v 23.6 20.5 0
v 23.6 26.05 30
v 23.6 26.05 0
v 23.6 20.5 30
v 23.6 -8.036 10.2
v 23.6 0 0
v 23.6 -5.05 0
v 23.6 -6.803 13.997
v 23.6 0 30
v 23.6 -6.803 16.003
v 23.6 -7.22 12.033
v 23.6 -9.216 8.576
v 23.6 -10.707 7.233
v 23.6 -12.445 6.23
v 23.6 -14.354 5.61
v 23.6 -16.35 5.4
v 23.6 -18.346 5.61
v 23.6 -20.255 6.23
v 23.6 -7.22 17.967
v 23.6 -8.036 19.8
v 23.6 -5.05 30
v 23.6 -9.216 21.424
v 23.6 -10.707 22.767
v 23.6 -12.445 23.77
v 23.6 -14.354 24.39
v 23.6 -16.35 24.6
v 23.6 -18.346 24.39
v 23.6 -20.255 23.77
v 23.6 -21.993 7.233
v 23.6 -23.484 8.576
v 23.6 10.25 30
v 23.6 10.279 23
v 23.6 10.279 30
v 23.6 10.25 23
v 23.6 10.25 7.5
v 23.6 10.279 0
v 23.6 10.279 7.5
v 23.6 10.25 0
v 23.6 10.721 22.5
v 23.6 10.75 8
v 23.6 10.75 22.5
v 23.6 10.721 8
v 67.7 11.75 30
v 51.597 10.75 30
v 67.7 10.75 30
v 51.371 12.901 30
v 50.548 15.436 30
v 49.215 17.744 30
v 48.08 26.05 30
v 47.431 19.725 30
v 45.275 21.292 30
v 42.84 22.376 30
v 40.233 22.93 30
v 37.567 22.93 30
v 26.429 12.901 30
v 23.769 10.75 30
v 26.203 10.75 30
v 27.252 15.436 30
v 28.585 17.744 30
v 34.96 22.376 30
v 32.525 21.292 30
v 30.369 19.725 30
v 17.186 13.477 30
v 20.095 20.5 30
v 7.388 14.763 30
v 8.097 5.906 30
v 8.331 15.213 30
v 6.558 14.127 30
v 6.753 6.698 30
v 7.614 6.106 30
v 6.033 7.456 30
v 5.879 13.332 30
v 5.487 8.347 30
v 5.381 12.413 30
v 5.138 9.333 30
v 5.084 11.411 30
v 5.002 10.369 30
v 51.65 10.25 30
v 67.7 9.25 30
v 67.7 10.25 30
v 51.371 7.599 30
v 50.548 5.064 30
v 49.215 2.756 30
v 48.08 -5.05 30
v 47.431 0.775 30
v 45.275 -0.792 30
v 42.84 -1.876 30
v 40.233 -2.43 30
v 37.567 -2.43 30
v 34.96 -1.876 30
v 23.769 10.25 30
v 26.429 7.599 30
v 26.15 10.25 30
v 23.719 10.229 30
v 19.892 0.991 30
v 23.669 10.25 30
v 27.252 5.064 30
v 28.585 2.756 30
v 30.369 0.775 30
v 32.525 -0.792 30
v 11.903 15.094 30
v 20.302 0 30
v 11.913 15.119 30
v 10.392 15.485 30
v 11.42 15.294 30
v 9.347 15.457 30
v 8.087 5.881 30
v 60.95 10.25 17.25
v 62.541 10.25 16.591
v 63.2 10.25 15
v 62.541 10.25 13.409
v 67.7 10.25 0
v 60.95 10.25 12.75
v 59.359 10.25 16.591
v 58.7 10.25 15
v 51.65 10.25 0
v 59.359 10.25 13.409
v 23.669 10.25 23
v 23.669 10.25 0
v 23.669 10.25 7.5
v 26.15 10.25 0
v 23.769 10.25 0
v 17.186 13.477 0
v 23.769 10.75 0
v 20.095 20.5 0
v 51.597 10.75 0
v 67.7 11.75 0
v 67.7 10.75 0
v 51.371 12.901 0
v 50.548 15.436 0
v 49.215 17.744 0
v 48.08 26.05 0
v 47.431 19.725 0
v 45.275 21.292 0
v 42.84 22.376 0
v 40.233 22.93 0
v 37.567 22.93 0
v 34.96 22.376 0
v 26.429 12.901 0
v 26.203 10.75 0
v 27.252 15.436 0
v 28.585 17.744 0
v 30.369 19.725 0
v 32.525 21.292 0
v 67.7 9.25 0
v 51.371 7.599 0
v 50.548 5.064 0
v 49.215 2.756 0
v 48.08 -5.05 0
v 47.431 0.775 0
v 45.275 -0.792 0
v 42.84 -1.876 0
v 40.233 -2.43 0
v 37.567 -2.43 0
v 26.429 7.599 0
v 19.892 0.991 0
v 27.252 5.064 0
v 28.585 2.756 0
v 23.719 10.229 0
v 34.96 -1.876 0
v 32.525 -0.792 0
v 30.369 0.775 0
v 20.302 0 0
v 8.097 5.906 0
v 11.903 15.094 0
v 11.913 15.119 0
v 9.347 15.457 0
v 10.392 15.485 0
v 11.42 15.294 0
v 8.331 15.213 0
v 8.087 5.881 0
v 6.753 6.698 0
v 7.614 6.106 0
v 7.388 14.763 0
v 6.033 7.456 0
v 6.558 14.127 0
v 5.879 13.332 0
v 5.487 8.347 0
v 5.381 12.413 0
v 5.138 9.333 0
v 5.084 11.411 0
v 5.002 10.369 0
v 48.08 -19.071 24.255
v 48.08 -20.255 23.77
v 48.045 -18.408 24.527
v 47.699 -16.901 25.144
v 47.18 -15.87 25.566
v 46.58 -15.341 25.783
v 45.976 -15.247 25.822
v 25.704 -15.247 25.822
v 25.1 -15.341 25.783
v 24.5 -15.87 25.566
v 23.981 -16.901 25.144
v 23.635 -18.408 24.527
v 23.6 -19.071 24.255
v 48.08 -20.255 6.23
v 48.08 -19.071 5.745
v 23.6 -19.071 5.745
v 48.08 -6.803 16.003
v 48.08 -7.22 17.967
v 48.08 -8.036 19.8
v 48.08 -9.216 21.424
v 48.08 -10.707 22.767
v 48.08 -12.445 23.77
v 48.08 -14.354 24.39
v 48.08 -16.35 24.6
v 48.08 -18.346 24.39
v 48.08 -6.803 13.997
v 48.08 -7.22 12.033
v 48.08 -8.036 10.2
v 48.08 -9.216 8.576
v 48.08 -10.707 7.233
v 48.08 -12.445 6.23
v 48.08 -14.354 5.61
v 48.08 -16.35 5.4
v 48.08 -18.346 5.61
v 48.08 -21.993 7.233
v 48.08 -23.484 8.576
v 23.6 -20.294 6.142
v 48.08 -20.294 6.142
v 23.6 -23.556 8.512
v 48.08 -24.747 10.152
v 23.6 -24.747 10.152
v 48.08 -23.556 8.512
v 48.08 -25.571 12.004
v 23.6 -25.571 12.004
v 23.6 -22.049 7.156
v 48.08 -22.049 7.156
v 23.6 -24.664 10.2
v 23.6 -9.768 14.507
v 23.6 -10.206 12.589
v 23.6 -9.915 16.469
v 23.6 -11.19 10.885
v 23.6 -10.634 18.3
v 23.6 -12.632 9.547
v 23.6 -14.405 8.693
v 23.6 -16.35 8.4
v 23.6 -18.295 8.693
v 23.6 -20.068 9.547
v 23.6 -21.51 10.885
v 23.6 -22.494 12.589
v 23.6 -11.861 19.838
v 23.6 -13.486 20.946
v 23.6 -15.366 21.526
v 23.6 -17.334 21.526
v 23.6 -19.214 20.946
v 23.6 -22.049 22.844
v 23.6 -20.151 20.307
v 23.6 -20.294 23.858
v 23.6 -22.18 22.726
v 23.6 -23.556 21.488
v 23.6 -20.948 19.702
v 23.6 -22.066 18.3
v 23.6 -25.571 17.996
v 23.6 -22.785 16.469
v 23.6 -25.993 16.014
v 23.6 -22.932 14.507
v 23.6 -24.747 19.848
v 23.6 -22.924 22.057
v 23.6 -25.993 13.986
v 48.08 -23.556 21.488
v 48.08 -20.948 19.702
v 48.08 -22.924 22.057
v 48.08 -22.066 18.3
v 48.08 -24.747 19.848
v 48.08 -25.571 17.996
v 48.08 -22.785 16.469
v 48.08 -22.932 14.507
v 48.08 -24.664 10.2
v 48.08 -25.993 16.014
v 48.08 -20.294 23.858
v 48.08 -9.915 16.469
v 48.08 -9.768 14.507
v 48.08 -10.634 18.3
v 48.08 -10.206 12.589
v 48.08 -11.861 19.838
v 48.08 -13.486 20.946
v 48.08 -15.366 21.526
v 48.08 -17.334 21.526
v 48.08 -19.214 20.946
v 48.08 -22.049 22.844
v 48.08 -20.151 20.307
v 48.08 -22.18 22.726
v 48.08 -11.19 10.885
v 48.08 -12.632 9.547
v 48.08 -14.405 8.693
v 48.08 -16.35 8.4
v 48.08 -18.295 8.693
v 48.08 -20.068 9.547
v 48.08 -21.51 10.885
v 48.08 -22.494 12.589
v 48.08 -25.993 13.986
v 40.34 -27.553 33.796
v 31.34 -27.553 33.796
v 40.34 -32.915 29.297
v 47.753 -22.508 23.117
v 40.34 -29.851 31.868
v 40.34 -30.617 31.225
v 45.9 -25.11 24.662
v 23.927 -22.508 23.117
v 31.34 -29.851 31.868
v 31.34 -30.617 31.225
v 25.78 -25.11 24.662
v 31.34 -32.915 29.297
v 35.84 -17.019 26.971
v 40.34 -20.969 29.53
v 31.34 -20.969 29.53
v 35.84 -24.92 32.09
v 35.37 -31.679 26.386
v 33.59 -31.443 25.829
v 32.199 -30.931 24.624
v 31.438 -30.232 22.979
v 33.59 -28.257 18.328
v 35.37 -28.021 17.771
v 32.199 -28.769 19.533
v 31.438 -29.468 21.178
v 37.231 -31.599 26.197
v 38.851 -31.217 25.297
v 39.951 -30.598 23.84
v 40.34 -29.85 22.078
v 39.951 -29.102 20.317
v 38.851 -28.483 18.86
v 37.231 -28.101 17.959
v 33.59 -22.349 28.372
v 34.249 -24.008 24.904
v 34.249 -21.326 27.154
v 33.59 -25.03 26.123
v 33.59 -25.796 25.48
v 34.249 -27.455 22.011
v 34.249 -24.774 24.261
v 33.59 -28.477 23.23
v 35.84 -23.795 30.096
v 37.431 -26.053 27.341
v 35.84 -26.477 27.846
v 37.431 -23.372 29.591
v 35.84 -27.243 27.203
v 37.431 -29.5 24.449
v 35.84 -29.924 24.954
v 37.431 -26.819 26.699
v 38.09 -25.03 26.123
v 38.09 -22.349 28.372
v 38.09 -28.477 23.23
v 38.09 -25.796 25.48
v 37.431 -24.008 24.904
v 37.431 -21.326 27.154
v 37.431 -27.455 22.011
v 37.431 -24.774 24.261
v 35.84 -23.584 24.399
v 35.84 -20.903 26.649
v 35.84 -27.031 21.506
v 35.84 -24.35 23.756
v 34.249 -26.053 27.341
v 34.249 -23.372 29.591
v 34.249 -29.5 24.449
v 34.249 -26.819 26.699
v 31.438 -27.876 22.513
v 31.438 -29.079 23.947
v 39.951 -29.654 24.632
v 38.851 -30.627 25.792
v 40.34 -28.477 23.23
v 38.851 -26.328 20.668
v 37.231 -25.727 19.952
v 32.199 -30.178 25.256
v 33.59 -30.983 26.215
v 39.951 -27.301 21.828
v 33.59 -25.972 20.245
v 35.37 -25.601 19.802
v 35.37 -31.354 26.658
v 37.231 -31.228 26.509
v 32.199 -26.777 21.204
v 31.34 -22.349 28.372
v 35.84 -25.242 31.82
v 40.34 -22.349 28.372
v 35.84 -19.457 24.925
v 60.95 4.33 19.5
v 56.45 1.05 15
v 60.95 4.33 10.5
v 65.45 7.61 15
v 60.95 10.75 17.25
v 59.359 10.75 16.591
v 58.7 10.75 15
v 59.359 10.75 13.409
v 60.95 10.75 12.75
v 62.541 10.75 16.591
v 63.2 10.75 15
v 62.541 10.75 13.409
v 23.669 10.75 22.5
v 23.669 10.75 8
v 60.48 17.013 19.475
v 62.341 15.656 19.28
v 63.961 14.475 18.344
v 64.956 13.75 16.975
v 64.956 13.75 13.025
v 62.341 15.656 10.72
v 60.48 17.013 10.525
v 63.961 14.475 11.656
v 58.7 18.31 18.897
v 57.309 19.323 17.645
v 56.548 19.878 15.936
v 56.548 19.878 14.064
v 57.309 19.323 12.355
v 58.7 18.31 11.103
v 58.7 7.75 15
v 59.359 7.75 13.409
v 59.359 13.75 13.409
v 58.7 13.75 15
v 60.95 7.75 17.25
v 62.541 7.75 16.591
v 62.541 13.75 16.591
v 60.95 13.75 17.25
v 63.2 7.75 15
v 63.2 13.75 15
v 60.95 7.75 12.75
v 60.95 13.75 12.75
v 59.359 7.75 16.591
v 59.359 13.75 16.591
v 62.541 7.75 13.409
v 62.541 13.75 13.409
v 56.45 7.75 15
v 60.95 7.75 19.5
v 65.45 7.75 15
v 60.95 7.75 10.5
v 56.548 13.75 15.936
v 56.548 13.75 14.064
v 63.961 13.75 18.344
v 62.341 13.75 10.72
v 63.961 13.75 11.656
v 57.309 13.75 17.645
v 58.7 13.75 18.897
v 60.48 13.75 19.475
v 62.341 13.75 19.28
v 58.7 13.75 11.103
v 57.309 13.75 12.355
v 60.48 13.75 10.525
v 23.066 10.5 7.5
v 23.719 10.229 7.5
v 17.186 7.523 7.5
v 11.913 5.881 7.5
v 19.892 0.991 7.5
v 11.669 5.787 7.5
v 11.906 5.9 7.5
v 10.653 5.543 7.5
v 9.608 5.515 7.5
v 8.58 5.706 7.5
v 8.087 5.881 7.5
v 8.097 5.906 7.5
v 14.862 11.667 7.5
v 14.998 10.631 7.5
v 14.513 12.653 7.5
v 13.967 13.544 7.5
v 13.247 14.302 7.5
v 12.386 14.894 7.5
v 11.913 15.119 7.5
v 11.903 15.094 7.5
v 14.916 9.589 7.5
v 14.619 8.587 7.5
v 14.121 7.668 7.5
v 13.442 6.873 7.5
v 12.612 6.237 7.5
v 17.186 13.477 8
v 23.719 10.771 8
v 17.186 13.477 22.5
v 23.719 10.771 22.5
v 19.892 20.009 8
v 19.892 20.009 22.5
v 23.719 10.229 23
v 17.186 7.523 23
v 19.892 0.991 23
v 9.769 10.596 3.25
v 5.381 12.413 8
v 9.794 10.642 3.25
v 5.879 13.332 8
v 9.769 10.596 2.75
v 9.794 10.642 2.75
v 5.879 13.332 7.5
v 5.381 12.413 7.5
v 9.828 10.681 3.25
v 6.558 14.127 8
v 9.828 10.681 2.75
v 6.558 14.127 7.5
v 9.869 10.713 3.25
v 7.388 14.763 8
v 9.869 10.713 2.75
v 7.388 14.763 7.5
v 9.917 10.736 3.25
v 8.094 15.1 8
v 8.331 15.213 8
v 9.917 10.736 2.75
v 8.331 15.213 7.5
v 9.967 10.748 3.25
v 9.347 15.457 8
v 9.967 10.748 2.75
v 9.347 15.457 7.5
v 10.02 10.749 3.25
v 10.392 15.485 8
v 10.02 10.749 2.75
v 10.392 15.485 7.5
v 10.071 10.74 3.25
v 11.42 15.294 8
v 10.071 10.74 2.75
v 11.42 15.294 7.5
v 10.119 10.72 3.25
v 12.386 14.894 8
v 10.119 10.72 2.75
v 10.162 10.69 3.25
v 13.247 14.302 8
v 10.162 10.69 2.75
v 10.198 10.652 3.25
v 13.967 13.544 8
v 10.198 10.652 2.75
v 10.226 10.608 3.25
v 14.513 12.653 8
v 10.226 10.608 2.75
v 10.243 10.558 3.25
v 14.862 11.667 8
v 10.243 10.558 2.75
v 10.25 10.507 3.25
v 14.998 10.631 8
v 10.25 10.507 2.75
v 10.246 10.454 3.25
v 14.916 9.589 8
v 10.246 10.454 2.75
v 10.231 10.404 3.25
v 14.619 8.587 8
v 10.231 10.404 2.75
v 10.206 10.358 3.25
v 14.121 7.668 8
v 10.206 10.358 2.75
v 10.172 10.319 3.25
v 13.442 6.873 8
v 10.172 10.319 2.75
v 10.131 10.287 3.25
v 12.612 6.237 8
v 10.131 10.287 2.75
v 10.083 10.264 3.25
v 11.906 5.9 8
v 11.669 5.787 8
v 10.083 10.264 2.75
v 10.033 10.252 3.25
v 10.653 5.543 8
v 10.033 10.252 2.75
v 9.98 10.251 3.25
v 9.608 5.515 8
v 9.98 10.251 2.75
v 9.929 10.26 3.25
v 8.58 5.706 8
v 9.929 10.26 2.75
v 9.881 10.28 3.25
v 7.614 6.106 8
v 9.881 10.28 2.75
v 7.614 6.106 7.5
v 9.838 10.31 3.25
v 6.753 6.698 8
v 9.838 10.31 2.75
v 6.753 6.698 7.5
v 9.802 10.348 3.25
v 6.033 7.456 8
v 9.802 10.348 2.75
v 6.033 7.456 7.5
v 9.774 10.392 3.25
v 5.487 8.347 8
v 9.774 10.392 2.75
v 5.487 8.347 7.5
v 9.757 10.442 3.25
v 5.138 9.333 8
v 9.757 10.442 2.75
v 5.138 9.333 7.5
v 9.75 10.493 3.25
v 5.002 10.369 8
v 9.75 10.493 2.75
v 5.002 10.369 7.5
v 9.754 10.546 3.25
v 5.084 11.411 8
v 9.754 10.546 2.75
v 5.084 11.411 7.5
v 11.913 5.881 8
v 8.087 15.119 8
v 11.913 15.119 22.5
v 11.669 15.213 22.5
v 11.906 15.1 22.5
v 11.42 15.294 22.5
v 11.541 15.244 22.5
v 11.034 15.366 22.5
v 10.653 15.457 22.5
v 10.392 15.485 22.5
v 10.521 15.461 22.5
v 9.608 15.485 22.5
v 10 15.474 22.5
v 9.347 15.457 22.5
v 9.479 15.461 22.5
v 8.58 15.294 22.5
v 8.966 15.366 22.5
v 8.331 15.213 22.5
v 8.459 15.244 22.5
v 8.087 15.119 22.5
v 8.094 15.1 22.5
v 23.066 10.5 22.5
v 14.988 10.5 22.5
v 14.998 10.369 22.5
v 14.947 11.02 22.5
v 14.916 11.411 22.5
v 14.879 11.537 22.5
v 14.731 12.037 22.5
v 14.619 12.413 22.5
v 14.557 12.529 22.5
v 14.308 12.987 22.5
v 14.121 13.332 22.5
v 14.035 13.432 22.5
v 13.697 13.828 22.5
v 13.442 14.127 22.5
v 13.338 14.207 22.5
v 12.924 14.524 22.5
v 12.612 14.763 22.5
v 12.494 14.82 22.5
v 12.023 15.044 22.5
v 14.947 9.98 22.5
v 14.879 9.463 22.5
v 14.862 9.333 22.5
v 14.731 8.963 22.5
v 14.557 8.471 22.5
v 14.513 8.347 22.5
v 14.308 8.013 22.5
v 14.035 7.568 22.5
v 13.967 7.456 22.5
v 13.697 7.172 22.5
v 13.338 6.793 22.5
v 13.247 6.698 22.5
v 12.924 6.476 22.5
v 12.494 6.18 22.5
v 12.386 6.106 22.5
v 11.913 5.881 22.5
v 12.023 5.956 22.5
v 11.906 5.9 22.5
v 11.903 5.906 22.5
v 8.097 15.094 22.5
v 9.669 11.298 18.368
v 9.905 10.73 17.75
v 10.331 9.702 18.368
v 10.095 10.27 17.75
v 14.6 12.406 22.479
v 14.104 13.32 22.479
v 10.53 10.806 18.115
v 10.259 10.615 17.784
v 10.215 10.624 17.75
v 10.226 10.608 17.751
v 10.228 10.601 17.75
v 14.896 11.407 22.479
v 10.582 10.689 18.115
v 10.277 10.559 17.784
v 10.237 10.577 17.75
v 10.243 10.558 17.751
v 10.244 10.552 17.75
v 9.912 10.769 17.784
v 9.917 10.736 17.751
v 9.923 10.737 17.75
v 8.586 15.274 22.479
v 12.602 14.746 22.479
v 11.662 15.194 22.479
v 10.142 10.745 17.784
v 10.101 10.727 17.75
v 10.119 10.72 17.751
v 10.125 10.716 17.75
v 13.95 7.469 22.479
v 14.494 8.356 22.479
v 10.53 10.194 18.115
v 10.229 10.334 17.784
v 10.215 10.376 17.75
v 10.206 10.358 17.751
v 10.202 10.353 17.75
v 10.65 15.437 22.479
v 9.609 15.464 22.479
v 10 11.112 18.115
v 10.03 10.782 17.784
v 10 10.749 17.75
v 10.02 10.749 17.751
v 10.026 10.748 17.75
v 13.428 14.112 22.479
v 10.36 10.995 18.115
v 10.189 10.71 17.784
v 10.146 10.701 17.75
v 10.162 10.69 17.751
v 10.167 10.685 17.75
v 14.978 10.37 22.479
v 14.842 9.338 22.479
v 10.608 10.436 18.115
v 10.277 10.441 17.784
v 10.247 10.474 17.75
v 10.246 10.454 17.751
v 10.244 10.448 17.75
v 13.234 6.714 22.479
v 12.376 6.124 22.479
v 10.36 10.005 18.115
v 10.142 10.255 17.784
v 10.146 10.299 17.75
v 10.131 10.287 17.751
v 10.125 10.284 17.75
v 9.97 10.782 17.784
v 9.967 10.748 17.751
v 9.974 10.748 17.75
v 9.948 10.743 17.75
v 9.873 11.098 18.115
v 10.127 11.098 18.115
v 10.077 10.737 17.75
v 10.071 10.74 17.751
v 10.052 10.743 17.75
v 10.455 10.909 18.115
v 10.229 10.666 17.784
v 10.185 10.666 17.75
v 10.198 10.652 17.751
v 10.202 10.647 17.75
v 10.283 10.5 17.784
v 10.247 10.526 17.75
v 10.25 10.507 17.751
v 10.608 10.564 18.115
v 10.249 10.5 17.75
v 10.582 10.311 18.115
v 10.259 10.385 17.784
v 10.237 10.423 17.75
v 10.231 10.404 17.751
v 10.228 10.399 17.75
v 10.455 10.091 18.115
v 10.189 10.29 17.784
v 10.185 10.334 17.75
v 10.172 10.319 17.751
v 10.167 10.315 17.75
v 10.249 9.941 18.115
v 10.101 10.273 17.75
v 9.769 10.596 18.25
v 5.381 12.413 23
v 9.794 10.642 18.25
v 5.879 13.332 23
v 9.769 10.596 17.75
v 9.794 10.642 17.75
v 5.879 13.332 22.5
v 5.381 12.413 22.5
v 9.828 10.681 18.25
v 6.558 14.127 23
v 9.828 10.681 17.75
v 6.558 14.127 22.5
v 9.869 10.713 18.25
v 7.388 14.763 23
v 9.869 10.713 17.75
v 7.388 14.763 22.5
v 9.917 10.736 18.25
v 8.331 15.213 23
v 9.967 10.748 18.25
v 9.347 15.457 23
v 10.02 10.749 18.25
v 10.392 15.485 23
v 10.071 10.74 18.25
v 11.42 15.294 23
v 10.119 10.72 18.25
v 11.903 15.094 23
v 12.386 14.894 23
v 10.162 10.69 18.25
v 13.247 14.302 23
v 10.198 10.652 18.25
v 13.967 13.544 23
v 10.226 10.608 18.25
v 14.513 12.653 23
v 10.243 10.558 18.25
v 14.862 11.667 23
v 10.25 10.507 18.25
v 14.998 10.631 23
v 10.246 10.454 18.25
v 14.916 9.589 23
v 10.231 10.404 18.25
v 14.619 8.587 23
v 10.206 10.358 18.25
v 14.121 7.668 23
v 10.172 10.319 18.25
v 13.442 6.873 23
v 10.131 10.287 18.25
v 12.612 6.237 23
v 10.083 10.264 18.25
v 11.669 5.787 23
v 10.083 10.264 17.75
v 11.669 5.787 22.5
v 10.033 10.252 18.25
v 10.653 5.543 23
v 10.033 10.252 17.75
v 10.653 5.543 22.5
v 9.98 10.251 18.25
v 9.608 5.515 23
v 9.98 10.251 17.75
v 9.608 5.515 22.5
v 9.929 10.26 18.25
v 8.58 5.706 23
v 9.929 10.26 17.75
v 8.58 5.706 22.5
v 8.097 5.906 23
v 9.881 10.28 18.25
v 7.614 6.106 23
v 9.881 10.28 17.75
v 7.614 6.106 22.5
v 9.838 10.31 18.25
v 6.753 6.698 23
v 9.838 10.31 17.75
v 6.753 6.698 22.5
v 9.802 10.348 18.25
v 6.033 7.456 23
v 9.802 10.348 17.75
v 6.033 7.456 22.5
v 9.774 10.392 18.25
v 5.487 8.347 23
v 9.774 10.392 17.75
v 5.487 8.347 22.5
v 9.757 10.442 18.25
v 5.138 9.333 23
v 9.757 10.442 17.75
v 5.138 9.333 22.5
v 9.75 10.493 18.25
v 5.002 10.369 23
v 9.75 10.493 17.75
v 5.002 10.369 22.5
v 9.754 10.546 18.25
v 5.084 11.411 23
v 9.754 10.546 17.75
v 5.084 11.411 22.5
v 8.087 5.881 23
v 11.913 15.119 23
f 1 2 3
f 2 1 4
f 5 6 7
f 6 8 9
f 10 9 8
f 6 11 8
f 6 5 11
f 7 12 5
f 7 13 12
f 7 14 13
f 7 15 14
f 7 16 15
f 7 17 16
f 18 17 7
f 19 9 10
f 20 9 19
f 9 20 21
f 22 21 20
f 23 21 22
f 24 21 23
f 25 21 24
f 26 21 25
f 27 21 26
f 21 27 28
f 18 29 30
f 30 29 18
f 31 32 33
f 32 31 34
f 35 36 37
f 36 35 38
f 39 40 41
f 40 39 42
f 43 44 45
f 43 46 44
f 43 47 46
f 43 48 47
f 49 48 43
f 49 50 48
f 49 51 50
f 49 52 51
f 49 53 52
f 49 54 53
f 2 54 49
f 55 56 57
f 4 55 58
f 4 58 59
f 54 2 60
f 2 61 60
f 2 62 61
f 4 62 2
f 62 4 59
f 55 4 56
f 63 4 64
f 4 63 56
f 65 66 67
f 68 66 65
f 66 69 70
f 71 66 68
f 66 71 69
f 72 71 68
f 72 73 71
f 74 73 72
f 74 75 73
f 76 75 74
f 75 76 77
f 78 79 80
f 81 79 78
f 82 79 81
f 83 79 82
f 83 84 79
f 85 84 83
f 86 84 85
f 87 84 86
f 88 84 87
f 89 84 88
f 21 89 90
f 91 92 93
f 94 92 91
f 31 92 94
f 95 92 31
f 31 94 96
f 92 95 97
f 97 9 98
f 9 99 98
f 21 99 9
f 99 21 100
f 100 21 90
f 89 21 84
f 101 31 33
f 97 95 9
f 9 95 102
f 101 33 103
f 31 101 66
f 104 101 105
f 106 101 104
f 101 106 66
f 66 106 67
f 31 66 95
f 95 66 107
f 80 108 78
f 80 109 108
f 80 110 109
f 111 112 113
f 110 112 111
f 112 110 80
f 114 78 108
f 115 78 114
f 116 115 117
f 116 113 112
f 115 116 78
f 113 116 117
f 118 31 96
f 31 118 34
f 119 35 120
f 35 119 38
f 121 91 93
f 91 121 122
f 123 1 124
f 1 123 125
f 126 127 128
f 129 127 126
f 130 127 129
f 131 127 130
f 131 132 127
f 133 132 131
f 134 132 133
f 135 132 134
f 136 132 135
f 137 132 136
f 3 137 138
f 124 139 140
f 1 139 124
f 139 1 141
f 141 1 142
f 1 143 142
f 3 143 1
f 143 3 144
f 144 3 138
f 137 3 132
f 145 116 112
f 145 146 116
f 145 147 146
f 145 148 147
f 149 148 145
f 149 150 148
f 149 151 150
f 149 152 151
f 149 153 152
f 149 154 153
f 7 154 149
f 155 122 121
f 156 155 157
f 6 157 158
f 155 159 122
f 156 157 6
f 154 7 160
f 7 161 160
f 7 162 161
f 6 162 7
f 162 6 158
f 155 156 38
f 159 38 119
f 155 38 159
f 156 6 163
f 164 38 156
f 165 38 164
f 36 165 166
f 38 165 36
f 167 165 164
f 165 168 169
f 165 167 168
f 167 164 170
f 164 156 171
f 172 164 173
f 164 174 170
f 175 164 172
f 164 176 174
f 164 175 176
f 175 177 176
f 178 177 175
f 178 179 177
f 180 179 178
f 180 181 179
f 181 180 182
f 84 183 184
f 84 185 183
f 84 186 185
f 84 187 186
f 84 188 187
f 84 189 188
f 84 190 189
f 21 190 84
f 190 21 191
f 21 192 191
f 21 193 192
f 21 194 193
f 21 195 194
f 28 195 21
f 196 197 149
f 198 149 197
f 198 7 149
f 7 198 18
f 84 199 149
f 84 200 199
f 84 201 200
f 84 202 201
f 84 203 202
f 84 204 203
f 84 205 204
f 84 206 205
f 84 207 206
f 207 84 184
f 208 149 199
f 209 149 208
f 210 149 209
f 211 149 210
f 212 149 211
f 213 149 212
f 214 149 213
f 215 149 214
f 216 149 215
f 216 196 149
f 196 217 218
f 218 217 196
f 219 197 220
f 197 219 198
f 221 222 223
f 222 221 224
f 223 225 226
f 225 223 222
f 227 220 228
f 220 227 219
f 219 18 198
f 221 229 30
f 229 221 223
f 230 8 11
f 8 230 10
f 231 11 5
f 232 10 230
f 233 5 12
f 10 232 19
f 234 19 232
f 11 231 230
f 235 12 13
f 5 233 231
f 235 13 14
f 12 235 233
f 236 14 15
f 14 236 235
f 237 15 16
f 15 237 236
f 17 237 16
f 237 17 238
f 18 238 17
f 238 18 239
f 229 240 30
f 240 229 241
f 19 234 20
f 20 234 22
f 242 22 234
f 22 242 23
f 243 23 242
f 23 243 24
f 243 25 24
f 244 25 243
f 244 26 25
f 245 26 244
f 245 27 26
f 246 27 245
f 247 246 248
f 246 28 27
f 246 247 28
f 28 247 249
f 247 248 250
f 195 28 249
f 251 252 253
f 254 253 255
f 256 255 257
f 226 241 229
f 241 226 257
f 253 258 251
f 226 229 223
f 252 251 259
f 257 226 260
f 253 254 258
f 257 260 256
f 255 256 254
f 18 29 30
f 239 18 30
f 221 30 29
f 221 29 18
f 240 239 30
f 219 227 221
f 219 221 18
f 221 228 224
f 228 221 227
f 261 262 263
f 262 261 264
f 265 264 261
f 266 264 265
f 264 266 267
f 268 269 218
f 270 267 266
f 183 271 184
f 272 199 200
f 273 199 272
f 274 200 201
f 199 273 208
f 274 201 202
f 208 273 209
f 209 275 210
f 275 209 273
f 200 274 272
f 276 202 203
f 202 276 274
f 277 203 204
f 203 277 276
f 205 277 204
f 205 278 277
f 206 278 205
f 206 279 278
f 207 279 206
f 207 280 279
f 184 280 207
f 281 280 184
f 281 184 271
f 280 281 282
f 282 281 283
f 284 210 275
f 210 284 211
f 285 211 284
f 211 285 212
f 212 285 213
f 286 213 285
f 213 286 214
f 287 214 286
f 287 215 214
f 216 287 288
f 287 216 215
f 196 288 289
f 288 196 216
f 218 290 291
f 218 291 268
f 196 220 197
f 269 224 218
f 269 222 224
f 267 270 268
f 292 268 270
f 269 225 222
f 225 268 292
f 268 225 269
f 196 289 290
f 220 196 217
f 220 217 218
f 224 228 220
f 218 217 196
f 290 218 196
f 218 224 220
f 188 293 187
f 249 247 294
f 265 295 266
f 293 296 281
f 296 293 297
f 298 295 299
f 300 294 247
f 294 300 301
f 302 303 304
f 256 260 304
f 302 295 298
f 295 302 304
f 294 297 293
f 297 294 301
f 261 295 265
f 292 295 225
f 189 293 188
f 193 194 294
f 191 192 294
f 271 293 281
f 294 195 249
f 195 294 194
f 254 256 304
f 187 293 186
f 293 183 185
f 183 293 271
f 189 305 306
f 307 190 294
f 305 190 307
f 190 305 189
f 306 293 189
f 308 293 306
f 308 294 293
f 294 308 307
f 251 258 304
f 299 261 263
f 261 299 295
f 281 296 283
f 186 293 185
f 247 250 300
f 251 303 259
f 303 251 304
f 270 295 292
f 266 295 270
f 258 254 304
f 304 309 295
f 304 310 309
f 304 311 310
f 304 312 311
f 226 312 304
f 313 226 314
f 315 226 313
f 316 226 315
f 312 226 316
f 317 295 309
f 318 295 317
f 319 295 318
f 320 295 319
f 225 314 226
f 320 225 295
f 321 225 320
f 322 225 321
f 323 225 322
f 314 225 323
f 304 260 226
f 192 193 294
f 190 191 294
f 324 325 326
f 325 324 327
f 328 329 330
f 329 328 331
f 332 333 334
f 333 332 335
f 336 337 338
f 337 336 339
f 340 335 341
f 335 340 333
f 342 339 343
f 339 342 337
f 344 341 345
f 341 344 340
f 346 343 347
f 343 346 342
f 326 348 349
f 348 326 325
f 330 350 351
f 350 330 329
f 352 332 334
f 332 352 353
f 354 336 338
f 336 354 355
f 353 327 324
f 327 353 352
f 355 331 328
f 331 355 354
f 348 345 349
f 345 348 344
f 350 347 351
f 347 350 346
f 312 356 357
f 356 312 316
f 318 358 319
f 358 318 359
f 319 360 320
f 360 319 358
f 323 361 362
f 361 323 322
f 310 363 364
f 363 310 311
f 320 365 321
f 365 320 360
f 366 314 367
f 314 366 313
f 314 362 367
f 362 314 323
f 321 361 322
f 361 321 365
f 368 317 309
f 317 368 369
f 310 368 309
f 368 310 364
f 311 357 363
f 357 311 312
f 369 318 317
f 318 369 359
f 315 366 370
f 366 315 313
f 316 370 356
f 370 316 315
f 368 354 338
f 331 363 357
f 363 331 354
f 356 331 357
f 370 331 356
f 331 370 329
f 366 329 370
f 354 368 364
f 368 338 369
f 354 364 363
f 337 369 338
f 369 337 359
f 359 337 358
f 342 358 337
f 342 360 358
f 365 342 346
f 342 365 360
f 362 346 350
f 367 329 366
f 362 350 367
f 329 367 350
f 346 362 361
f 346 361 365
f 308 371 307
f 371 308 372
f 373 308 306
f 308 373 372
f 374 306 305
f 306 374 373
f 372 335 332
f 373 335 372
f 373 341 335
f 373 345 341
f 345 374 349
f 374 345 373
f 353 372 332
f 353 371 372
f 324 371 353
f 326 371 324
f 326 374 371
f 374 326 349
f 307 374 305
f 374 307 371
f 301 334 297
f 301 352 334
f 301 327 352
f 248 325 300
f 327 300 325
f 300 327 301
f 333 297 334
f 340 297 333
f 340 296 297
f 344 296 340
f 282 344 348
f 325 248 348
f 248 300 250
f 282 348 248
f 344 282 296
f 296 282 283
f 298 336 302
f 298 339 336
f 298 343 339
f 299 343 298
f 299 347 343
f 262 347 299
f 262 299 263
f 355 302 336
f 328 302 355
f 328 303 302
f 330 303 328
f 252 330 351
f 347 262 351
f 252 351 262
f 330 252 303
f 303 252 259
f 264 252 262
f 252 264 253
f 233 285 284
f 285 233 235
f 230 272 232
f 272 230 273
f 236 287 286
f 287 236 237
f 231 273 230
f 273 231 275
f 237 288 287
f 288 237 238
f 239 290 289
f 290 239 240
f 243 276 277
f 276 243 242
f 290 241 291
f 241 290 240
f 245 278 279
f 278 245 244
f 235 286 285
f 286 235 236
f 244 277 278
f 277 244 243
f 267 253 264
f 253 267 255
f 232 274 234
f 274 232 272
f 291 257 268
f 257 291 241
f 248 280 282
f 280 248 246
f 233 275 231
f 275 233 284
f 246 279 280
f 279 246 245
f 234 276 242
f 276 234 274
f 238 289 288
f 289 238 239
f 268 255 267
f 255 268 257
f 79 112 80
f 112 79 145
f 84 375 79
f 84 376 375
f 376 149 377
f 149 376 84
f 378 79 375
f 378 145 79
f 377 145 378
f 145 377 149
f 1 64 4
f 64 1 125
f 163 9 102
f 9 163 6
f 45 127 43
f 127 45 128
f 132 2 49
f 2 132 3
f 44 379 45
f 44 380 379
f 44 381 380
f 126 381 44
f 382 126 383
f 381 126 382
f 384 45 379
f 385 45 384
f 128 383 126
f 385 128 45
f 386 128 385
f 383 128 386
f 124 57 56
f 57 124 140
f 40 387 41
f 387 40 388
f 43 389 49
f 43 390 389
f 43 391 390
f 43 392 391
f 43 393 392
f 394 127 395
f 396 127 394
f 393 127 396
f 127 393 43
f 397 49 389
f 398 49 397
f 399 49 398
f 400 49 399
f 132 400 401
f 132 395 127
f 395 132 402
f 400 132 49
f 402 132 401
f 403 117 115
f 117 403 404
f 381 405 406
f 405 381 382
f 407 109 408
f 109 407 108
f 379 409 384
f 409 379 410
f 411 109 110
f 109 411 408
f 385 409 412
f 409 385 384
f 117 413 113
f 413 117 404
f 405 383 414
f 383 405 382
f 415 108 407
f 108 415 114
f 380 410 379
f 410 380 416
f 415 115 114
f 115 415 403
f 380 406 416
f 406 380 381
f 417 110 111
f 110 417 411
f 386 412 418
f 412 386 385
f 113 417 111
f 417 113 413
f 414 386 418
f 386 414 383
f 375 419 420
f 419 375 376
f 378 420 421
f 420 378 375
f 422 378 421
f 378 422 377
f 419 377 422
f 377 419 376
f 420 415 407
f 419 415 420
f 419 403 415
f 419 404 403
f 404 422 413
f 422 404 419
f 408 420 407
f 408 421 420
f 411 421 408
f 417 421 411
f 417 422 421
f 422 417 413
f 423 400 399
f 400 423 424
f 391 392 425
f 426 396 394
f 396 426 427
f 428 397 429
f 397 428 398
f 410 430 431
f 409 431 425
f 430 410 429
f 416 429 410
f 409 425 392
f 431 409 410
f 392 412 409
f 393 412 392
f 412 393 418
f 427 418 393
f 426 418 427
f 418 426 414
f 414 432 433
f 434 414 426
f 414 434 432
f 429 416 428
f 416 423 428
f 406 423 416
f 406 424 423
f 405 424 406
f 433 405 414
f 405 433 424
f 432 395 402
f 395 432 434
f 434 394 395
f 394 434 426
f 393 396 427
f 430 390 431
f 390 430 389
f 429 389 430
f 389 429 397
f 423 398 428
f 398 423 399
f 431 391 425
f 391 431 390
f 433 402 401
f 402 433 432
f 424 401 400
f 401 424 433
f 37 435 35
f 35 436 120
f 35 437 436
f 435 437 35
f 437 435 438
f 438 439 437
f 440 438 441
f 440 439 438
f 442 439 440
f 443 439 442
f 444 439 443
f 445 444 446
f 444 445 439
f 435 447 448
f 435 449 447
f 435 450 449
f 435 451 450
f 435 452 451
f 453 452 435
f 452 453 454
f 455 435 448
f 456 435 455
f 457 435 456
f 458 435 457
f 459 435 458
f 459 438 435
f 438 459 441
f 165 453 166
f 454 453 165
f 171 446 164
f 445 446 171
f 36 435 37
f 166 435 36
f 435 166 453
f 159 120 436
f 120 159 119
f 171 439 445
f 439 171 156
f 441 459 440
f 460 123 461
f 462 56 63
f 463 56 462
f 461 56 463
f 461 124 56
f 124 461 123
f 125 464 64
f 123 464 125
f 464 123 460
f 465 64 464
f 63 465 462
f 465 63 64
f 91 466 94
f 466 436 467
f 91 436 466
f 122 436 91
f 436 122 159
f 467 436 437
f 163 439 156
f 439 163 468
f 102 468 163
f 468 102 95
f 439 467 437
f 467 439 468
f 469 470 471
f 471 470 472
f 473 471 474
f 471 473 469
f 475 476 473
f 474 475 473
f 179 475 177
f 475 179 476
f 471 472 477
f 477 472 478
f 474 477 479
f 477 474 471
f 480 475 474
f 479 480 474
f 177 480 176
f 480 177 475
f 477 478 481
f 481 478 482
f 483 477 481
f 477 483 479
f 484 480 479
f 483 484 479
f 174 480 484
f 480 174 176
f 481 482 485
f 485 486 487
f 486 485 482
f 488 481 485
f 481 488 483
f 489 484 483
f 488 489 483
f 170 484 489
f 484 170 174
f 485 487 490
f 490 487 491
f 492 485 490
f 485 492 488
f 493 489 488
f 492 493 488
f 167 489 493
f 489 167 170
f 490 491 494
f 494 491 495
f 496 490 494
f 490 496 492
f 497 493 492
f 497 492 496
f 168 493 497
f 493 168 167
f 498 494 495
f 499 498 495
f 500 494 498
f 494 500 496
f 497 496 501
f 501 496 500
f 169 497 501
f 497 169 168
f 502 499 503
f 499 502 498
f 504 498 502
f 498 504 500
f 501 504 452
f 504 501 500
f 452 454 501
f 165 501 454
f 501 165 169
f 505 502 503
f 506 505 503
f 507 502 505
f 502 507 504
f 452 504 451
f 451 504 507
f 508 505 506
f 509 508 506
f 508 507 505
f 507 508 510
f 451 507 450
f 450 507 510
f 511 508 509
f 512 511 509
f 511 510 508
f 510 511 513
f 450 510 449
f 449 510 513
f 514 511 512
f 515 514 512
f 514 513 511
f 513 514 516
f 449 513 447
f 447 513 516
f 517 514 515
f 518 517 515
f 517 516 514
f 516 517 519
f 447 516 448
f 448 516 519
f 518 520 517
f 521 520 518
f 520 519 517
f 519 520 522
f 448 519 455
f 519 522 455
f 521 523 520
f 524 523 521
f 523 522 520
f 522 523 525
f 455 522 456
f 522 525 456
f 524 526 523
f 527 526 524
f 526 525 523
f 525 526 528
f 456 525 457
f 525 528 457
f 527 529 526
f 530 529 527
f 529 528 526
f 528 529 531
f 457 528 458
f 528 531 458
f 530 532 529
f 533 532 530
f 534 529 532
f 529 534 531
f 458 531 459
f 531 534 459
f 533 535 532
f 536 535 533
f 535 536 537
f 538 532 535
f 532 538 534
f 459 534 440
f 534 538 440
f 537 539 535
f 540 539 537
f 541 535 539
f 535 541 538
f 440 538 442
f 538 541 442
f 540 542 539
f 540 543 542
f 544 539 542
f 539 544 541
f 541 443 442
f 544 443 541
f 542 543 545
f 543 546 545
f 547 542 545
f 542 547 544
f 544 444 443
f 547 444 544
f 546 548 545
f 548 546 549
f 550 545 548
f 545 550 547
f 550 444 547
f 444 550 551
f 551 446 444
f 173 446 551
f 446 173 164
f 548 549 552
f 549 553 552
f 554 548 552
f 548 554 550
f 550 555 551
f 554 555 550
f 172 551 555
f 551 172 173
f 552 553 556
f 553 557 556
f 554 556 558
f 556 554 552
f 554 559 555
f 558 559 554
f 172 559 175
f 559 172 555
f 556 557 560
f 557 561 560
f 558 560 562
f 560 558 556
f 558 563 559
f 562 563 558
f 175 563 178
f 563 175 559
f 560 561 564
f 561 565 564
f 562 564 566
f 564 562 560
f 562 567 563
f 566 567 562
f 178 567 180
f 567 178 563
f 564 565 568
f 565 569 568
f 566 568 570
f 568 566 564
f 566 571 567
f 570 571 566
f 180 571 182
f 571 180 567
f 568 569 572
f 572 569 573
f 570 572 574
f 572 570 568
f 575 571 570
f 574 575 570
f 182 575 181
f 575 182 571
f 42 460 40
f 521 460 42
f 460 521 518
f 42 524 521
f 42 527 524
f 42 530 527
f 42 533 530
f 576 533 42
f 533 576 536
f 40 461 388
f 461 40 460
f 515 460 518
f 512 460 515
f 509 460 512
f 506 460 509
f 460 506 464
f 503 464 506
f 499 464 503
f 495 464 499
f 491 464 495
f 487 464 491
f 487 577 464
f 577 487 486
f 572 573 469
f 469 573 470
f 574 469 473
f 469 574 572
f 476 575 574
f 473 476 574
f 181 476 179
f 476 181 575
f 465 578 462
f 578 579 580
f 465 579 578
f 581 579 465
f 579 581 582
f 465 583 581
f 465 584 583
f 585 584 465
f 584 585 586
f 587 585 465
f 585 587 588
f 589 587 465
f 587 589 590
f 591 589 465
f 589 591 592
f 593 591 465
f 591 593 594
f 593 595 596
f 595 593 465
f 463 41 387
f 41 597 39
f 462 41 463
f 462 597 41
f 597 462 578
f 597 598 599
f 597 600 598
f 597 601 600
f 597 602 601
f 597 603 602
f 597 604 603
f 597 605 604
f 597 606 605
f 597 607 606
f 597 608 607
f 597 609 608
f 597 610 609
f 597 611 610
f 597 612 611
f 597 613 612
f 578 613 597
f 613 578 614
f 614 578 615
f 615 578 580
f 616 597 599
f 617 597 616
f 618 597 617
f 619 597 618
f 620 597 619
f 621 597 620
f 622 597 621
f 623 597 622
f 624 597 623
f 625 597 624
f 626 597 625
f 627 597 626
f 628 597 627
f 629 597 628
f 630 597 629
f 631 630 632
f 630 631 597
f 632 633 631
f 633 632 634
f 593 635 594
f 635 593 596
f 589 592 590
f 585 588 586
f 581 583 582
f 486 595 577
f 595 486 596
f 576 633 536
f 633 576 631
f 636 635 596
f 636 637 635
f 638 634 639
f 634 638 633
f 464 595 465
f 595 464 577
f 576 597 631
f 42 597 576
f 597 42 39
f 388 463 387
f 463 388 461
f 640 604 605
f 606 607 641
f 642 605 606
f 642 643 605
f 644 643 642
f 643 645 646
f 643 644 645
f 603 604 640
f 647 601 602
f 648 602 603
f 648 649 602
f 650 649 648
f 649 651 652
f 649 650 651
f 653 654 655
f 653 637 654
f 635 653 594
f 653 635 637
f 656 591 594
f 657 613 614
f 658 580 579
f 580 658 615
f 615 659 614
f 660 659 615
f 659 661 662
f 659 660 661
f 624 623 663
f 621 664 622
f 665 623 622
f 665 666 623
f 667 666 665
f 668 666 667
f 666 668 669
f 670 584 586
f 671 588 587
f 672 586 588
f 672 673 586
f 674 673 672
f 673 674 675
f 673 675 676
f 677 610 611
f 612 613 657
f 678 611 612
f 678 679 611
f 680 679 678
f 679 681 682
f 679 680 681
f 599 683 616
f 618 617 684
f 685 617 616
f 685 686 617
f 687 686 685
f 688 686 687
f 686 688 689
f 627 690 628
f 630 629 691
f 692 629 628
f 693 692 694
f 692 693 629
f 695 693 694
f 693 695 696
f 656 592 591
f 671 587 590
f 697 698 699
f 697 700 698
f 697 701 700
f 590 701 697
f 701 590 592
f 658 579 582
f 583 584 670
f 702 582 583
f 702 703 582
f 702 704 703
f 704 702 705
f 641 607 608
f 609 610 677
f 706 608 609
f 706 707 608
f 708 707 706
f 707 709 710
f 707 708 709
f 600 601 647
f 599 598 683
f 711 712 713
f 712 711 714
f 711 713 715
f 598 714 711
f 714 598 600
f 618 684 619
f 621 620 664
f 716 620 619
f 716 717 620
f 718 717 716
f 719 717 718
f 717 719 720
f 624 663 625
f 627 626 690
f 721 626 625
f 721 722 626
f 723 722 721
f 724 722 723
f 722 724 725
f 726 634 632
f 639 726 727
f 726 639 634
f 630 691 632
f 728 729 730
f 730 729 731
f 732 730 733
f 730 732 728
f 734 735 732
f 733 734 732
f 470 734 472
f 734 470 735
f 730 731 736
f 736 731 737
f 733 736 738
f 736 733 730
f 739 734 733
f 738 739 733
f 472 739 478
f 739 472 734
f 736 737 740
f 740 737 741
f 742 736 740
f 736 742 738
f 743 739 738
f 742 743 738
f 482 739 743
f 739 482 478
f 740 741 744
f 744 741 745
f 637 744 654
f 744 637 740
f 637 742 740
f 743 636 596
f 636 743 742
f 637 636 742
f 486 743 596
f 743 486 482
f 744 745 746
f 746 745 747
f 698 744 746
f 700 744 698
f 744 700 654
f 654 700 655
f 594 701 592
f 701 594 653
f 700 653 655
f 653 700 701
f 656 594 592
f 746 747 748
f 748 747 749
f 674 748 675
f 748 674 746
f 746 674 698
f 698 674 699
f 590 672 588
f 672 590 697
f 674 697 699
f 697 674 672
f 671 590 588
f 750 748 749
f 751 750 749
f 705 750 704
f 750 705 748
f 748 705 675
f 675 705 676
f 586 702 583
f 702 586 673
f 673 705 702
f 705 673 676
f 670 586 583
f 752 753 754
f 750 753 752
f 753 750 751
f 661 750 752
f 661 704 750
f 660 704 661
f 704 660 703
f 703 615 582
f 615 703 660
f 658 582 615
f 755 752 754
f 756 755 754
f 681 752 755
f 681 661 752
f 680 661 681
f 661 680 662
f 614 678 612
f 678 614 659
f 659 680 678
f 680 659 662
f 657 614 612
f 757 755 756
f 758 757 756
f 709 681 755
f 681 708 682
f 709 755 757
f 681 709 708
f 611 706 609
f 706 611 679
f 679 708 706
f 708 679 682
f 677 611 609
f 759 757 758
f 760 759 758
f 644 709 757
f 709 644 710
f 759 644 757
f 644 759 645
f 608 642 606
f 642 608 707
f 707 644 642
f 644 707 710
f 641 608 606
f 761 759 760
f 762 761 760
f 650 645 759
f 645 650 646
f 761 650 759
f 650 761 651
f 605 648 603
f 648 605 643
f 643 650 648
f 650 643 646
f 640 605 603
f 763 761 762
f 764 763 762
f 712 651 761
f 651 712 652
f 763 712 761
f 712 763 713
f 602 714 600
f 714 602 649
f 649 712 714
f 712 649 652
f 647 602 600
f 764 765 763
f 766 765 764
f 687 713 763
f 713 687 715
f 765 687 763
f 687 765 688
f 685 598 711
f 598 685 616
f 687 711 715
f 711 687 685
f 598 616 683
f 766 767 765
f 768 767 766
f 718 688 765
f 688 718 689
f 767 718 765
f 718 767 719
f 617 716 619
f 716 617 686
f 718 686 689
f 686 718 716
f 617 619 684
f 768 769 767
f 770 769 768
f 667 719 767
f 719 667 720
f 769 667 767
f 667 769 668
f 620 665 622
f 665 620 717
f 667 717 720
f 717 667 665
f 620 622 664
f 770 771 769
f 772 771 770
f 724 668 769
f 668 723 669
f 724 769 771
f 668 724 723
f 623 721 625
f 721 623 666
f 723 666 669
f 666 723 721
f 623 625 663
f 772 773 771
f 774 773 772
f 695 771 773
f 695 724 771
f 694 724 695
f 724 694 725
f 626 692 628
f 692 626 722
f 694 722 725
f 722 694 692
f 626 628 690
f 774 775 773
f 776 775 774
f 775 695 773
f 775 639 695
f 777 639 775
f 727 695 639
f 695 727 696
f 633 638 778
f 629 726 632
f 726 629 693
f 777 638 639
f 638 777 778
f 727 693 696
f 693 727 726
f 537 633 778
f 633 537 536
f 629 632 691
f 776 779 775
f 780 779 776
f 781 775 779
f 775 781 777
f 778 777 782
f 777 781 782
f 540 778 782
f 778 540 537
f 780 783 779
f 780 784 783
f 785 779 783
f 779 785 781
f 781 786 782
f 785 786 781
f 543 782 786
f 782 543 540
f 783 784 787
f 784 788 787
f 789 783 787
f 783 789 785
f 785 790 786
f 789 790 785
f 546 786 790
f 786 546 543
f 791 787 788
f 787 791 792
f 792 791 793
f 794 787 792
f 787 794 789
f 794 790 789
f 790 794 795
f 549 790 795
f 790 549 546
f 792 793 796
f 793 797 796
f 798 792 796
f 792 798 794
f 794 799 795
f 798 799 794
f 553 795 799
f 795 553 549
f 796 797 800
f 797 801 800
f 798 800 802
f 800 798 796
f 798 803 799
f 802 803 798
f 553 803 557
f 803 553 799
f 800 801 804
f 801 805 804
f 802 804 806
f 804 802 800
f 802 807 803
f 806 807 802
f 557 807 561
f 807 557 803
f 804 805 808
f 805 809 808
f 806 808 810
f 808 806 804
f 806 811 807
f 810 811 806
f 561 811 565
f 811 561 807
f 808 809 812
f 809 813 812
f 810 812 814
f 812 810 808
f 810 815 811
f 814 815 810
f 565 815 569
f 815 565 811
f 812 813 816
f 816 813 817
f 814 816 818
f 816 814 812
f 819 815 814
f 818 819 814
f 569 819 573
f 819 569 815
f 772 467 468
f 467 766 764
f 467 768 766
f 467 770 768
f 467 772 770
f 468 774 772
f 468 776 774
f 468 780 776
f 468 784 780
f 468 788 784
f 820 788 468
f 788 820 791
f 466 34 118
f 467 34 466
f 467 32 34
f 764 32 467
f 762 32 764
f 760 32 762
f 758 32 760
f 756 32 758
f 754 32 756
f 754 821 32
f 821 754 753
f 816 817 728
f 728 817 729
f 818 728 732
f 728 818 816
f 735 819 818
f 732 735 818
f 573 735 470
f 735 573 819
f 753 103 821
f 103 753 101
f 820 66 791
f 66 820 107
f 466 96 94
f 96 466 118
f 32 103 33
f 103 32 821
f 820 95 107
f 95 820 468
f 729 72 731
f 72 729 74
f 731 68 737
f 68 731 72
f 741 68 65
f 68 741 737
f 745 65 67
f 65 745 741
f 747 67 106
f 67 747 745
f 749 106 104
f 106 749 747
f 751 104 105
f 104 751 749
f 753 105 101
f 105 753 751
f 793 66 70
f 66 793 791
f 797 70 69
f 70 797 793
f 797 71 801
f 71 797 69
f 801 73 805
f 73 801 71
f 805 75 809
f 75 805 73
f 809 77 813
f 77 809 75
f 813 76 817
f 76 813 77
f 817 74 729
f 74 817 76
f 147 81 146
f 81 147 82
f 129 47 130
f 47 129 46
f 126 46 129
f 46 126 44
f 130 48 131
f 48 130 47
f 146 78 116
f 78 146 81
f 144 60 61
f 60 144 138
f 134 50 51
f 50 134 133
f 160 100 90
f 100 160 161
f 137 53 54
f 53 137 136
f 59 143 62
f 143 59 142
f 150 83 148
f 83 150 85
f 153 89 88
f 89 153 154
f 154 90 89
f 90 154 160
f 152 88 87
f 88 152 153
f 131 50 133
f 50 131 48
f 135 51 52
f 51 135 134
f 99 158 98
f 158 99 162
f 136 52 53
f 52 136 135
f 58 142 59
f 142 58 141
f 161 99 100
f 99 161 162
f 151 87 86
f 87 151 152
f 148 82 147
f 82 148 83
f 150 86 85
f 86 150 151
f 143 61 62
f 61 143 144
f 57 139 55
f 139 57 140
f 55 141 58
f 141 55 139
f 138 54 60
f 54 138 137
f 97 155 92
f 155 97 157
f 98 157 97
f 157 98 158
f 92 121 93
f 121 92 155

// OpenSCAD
$fn = 0;

//$fs = 0.1; // HQ cylinders
//$fa = 4; // HQ spheres/hulls
render_hinges = true;

//$fs = 2; // default
//$fa = 12; // default
//render_hinges = false;

clamp_height = 30;
pole_diam = 25 +0.5;
screw_hole_diam = 4.5;
screw_recess_diam = 9;
nut_type = 4; // 4=square, 6=hex
horiz_pole_diam = 13 +0.2;

hinged_pole_clamp(
  height=clamp_height,
  hole_diam=screw_hole_diam,
  hole_recess_diam=screw_recess_diam,
  horiz_diam=horiz_pole_diam,
  nut_type=nut_type,
  pole_diam=pole_diam);


module hinged_pole_clamp(
    height,
    hole_diam,
    pole_diam,
    hole_recess_diam,
    horiz_diam,
    horiz_tab_angle=40,
    horiz_thick=3,
    nut_type=6
){
  hinge_fill_x = 23.6; //hardcoded to fit the hinge footprint
  hinge_fill_y = 20;
  hinge_fill_z = height;
  hole_r = hole_diam/2;
  pole_r = pole_diam/2;
  hole_recess_r = hole_recess_diam/2;

  hpole_r = horiz_diam/2;

  half_space = 0.5; // gap between the two halfs
  half_width = pole_diam * 1.2;
  half_depth = pole_diam * 0.6;

  flap_width = 1;
  flap_height = hole_recess_diam*1.5;

  hinge_r1 = 5;
  num_hinges = clamp_height/(hinge_r1*2) - 1;

  difference (){

    union(){


      //one half
      hull(){
        translate([
            hinge_fill_x,
            0-(half_depth-((hinge_fill_y+half_space)/2)),
            0])
            cube(size=[half_width*0.8, half_depth, hinge_fill_z]);

        translate([
            hinge_fill_x+(half_width*0.8),
            (0-(half_depth-((hinge_fill_y+half_space)/2)))+half_depth-flap_width,
            0])
            cube(size=[
              (half_width*0.2)+(hole_recess_diam*1.5),
              flap_width,
              hinge_fill_z
            ]);

      }

      difference(){
        hull(){
          translate([
            hinge_fill_x,
            0-(half_depth-((hinge_fill_y+half_space)/2)),
            0])
              cube(size=[half_width*0.8, half_depth, hinge_fill_z]);

          translate([
              hinge_fill_x,
              0-(pole_diam/2)+(horiz_thick)-(hpole_r),
              height/2])
            pole_with_tabs_neg(
              width=half_width*0.8,
              pole_r=hpole_r,
              pole_thick=horiz_thick,
              hole_diam=screw_hole_diam,
              tab=false,
              tab_angle=horiz_tab_angle);
        }

        translate([
            hinge_fill_x-(pole_diam*0.1),
            0-(pole_diam/2)+(horiz_thick)-(hpole_r),
            height/2])
          pole_with_tabs_neg(
            width=half_width*0.9,
            pole_r=hpole_r,
            pole_thick=horiz_thick,
            hole_diam=screw_hole_diam,
            tab=true,
            tab_angle=horiz_tab_angle);

      }
      //hinge fill
      translate([0, 0, 0])
          cube(size=[hinge_fill_x, hinge_fill_y+half_space, hinge_fill_z]);

      //the other half
      hull(){
        translate([
          hinge_fill_x, (0-(half_depth-((hinge_fill_y+half_space)/2)))+half_depth+half_space,
          0
        ])
          cube(size=[half_width*0.8, half_depth, hinge_fill_z]);

        translate([
          hinge_fill_x+(half_width*0.8),
          (0-(half_depth-((hinge_fill_y+half_space)/2)))+half_depth+half_space,
          0
        ])
          cube(size=[
            (half_width*0.2)+(hole_recess_diam*1.5),
            flap_width,
            hinge_fill_z
          ]);
      }

      translate([
          hinge_fill_x,
          //0-(hinge_fill_y/2)-(hinge_fill_y-half_depth)+(horiz_thick/2),
          0-(pole_diam/2)+(horiz_thick)-(hpole_r),
          height/2])
        pole_with_tabs(
          width=half_width*0.8,
          pole_r=hpole_r,
          pole_thick=horiz_thick,
          hole_diam=screw_hole_diam,
          hole_recess_diam=screw_recess_diam,
          nut_type=nut_type,
          tab_angle=horiz_tab_angle);

    }

    translate([
        hinge_fill_x+(half_width*1)+(hole_recess_diam*0.75),

        (0-(half_depth-((hinge_fill_y+half_space)/2)))+half_depth+half_space,
        height/2]){

      rotate(a=90, v=[1,0,0]){
        cylinder(h=pole_diam*1.5, r=hole_r, center=true);

        translate([0,0,0+(half_depth/2)+3])
          cylinder(h=half_depth, r=hole_recess_r, center=true, $fn=nut_type);

        translate([0,0,0-(half_depth/2)-3])
          cylinder(h=half_depth, r=hole_recess_r, center=true);
      }
    }

    //pole hole
    translate([hinge_fill_x+(half_width/2), (hinge_fill_y+half_space)/2, -(((height*1.1)-hinge_fill_z)/2)]) {
      rotate(a=90, v=[0,0,0])
        cylinder(h=(height*1.1), r=pole_r);
    }

    //hinges
    if(render_hinges)
      translate([10, (hinge_fill_y+(half_space*2))/2 ,0])
        rotate(a=(-45/2), v=[0,0,1])
          vertical_hinge_negative(theta0=45, height=(hinge_fill_z/num_hinges), n=num_hinges, r1=hinge_r1);

  }
}

/*
* tol - the smallest distance allowable between interlocking parts of your 3d printer. This gap is the vertical (and horizontal) distance between the cones inside the hinge and is also the diameter and height of the small support structure between hinge elements
* r1 - the outer radius of the hinge. the surface of your part should not be farther away from the center of the hinge than this disntace.
* r2 - the furthest radius from the hinge where material is removed from the part.
* height - the height of each hinge element. The total height of the hinge is n*height. (the cut will extent beyond this distance by height/2 on both sides. The part where you are creating the hinge should have a height of n*height) the height must be greater than 2*r1
* n - the number of hinge elements. One hinge element is divided between the top and bottom.
* theta0 - the angle at which the hinge is printed
* theta1 - the internal angle formed when the hinge is turned to its limit in one direction (the x- part of the hinge_test_1 example when rotated clockwise as viewed from above)
* theta2 - the internal angle formed when the hinge is turned to its limit in the opposite direction
*/
module vertical_hinge_negative(tol=0.5,r1=5,r2=15,height=15,n=2,theta0=180,theta1=45,theta2=45) {

    arm_width=2*r1;
    union() {
        for(i=[0:n])
            translate([0,0,(i-0.5)*height])
                difference() {

                    //cone between hinges and cuts around the hinge
                    rotate_extrude()
                        polygon([[r1,0],[r1,height],[tol/2,height-r1+tol/2],
                                [tol/2,height-r1+1.5*tol],[r1,height+tol],
                                [r2,height+tol],[r2,0]]);


                    //exclude a rectangular shape for the arm the connects the hinge to the body
                    rotate((i%2)*theta0)
                        difference() {
                            translate([0,-arm_width/2,-height])
                                cube(size=[r2*2,arm_width,height*2]);

                            translate([0,0,height-r1])
                                cylinder(r1=0,r2=height,h=height);
                        }

                    //exclude a triangular shape that limits the motion of the arms on the side of the hinge
                    for(i=[0,1])
                        mirror([0,i,0])
                            rotate(-i*theta0)
                                translate([0,0,-tol])
                                    linear_extrude(height=height+3*tol)
                                        intersection() {
                                            circle(r=2*r2);

                                            rotate(theta0+180+theta2)
                                                translate([0,r2*3+arm_width/2+tol])
                                                    square(size=[r2*6,r2*6],center=true);

                                            rotate(theta0-theta1)
                                                translate([0,r2*3+arm_width/2+tol])
                                                    square(size=[r2*6,r2*6],center=true);

                                            rotate(theta0)
                                                translate([r2*3,0])
                                                    square(size=[r2*6,r2*6],center=true);
                                        }
            }
       }
}




//*********************************************************

module pole_with_tabs_neg(width, pole_r, pole_thick, hole_diam, tab=false, tab_angle=0, gap=1){
  rotate(a=90, v=[0,1,0]){
    cylinder(h=width, r=pole_r+pole_thick);
  }

  if(tab==true){
    // screw hole in tab
    rotate(a=tab_angle, v=[1,0,0])
      translate([width/2,
                 0,
                 pole_r+(pole_thick)+hole_diam ]) {
        // tab gap
        cube([width*1.1, gap, (hole_diam*2)+(pole_thick*3)], center=true);
      }
  }
}

module pole_with_tabs(width, pole_r, pole_thick, hole_diam, hole_recess_diam, nut_type=6, tab_angle=0, gap=1){
  hole_r = hole_diam/2;
  difference(){
    union(){
      rotate(a=90, v=[0,1,0]){
        cylinder(h=width, r=(pole_r+pole_thick)*1.01);
      }

      // tab block
      hull(){
        rotate(a=90, v=[0,1,0]){
          cylinder(h=width, r=(pole_r+pole_thick)*1.01);
        }
        rotate(a=tab_angle, v=[1,0,0])
          translate([width/2, 0, ((hole_recess_diam)+(pole_thick*2)+pole_r)/2]){
            cube([
              hole_recess_diam,
              (pole_thick*2)+gap,
              (hole_recess_diam)+(pole_thick*2)+pole_r],
              center=true);
          }
        }
    }

    // pole hole
    translate([0-(width*0.5), 0, 0])
      rotate(a=90, v=[0,1,0]){
        cylinder(h=width*2.0, r=pole_r);
      }

    // screw hole in tab
    rotate(a=tab_angle, v=[1,0,0])
      translate([width/2,
                 0,
                 pole_r+(pole_thick)+(hole_recess_diam/2) ]) {

        // screw hole
        rotate(a=90, v=[1,0,0]){
          cylinder(h=pole_r*3, r=hole_r, center=true);

          //nut/screw recesses
          translate([0, 0, 0+(pole_r/2)+(pole_thick+gap)]){
            cylinder(h=pole_r, r=hole_recess_diam/2, center=true);
          }
          translate([0, 0, 0-(pole_r/2)-(pole_thick+gap)]){
            cylinder(h=pole_r, r=hole_recess_diam/2, center=true, $fn=nut_type);
          }
        }

        // tab gap
        cube([width*1.1, gap, (hole_recess_diam*2)+(pole_thick*3)], center=true);
      }
  }

}
